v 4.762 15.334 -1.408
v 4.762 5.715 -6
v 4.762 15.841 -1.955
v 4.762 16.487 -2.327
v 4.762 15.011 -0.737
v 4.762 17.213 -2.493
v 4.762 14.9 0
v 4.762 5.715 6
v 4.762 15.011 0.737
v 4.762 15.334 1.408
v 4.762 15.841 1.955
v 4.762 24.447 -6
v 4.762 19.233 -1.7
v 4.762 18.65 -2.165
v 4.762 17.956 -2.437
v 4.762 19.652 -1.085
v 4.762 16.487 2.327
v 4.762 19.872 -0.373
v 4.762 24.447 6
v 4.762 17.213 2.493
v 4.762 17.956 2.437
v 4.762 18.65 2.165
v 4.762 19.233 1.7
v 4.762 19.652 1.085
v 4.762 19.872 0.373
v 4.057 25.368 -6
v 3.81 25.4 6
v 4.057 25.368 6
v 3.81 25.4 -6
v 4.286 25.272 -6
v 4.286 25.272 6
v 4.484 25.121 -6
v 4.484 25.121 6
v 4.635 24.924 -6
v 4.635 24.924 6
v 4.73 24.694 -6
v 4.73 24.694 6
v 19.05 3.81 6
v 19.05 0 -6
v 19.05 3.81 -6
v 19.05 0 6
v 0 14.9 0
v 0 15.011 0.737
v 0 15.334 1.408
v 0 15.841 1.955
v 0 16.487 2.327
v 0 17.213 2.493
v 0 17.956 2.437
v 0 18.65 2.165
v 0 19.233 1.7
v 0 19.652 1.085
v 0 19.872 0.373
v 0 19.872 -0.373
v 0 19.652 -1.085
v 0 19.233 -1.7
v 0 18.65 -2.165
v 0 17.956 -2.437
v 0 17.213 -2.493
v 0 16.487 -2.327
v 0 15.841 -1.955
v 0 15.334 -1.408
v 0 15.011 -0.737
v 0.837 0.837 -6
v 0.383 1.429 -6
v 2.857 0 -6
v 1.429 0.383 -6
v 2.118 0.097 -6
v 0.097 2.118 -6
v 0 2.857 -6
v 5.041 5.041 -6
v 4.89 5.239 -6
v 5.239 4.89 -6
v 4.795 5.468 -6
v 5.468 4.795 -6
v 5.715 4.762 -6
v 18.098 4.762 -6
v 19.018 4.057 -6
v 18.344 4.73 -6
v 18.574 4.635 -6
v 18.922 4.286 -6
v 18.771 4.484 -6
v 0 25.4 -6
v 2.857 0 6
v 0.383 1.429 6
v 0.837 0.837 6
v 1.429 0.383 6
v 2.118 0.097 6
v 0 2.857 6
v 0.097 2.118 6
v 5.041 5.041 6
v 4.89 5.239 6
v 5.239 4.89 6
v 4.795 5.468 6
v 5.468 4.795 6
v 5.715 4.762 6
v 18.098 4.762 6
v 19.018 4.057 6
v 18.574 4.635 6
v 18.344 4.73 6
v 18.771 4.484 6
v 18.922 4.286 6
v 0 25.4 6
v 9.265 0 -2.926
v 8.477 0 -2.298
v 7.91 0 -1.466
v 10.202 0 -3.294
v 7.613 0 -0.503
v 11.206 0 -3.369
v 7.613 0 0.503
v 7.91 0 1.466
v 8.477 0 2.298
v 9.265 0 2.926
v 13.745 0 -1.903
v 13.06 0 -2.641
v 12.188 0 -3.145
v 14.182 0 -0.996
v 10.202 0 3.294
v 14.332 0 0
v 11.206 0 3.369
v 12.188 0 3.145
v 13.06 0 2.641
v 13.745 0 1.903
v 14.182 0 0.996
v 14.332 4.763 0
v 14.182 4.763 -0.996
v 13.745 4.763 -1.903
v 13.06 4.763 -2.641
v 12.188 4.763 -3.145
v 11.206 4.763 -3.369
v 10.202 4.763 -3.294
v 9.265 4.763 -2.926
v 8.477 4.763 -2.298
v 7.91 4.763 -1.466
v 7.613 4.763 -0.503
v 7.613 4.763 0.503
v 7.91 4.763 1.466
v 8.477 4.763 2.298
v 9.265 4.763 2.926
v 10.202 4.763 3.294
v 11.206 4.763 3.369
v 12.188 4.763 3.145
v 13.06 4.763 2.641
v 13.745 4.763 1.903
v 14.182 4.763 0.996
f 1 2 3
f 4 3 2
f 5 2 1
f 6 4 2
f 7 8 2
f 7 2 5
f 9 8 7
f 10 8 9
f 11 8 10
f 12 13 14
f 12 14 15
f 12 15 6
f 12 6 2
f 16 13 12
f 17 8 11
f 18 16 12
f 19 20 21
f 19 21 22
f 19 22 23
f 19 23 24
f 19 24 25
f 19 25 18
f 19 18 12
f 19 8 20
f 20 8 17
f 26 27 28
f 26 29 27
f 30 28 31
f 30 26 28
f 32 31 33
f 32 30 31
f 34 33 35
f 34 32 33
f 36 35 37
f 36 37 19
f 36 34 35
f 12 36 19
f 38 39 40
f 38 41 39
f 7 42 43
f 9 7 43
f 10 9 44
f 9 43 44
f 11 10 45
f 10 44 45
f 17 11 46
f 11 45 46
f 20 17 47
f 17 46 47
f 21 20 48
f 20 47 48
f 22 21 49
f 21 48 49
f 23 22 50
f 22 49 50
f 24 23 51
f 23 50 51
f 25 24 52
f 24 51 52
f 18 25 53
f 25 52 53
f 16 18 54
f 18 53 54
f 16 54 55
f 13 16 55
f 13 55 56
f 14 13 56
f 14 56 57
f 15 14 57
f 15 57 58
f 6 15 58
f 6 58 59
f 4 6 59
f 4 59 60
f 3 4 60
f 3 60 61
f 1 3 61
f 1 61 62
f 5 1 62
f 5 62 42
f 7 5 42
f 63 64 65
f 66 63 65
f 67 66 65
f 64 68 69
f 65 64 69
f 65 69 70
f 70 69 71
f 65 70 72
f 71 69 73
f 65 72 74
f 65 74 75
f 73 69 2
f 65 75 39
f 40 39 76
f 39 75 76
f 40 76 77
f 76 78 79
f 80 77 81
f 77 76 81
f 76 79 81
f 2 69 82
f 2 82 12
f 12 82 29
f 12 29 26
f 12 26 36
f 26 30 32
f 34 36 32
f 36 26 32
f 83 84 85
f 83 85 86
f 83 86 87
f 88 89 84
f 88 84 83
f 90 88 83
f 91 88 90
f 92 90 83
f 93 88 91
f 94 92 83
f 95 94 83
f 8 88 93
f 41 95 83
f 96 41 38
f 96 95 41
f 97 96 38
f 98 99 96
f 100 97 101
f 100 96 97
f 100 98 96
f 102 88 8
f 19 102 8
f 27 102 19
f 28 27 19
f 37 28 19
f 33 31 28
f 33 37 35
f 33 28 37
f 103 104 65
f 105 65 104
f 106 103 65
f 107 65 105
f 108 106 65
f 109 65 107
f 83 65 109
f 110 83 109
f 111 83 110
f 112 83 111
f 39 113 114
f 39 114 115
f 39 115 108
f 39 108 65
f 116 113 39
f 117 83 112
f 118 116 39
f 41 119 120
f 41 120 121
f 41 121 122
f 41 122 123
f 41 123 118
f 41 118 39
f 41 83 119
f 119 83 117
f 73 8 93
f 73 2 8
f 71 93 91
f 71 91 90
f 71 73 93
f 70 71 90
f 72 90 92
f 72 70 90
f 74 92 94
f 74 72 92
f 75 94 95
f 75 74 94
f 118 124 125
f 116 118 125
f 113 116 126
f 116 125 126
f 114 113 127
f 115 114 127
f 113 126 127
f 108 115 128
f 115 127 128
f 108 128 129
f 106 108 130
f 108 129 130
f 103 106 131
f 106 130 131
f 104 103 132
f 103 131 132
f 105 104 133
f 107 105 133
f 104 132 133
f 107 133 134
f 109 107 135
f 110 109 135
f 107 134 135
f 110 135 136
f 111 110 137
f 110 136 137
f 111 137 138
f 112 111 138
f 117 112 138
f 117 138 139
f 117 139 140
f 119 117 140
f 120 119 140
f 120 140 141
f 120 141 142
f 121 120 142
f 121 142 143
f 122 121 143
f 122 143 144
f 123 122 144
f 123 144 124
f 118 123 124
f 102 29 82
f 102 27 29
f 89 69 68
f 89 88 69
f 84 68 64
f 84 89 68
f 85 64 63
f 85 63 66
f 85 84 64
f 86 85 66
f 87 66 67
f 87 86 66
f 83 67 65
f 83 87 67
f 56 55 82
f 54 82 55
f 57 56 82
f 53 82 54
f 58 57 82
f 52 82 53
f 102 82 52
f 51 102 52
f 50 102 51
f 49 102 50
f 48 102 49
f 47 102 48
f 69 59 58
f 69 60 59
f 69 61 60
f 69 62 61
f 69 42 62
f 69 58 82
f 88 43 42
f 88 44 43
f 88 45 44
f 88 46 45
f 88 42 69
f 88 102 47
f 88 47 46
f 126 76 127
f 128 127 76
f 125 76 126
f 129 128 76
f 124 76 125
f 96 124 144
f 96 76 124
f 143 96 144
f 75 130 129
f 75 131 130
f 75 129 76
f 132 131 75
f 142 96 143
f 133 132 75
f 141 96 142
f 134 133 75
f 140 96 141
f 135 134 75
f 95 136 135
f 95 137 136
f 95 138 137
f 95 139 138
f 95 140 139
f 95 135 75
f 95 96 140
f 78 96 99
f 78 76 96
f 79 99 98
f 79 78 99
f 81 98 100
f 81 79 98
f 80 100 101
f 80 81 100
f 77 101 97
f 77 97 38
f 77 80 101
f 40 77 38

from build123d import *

# Parameters (mm, degrees)
BOSS_EXTRUDE1_DEPTH     = 6
FILLET1_R               = 0.9525
FILLET2_R               = 2.8575
F_1_4_CLEARANCE_HOLE1_D = 6.7564
CUT_EXTRUDE1_REACH      = 34.312
SKETCH7_R               = 2.5


with BuildPart() as part:
    # Sketch3 → Boss-Extrude1 (new, symmetric)
    with BuildSketch(Plane.XY):
        Polygon((4.7625, 25.4), (0, 25.4), (0, 0), (19.05, 0), (19.05, 4.7625), (4.7625, 4.7625), align=None)
    extrude(amount=BOSS_EXTRUDE1_DEPTH, both=True)

    # Fillet1
    fillet1_edges = [part.edges().sort_by_distance(p)[0] for p in [
        (4.7625, 4.7625, 0),
        (19.05, 4.7625, 0),
        (4.7625, 25.4, 0),
    ]]
    fillet(fillet1_edges, radius=FILLET1_R)

    # Fillet2
    fillet2_edges = [part.edges().sort_by_distance(p)[0] for p in [
        (0, 0, 0),
    ]]
    fillet(fillet2_edges, radius=FILLET2_R)

    # 1/4 Clearance Hole1 (through all)
    with Locations(Plane(origin=(0, 0, 0), x_dir=(-1, 0, 0), z_dir=(0, -1, 0))):
        with Locations((-10.95375, 0)):
            Hole(F_1_4_CLEARANCE_HOLE1_D / 2)

    # Sketch7 → Cut-Extrude1 (cut, up to next)
    with BuildSketch(Plane.ZY, mode=Mode.PRIVATE) as cut_extrude1_sk1:
        with Locations(Location((0, 17.4, 0), (0, 0, 270))):
            Circle(SKETCH7_R)
    cut_extrude1_tool1 = extrude(cut_extrude1_sk1.sketch, amount=-CUT_EXTRUDE1_REACH, mode=Mode.PRIVATE) & part.part
    add(cut_extrude1_tool1.solids().sort_by_distance((0, 17.4, 0))[0], mode=Mode.SUBTRACT)


solid = part.part
